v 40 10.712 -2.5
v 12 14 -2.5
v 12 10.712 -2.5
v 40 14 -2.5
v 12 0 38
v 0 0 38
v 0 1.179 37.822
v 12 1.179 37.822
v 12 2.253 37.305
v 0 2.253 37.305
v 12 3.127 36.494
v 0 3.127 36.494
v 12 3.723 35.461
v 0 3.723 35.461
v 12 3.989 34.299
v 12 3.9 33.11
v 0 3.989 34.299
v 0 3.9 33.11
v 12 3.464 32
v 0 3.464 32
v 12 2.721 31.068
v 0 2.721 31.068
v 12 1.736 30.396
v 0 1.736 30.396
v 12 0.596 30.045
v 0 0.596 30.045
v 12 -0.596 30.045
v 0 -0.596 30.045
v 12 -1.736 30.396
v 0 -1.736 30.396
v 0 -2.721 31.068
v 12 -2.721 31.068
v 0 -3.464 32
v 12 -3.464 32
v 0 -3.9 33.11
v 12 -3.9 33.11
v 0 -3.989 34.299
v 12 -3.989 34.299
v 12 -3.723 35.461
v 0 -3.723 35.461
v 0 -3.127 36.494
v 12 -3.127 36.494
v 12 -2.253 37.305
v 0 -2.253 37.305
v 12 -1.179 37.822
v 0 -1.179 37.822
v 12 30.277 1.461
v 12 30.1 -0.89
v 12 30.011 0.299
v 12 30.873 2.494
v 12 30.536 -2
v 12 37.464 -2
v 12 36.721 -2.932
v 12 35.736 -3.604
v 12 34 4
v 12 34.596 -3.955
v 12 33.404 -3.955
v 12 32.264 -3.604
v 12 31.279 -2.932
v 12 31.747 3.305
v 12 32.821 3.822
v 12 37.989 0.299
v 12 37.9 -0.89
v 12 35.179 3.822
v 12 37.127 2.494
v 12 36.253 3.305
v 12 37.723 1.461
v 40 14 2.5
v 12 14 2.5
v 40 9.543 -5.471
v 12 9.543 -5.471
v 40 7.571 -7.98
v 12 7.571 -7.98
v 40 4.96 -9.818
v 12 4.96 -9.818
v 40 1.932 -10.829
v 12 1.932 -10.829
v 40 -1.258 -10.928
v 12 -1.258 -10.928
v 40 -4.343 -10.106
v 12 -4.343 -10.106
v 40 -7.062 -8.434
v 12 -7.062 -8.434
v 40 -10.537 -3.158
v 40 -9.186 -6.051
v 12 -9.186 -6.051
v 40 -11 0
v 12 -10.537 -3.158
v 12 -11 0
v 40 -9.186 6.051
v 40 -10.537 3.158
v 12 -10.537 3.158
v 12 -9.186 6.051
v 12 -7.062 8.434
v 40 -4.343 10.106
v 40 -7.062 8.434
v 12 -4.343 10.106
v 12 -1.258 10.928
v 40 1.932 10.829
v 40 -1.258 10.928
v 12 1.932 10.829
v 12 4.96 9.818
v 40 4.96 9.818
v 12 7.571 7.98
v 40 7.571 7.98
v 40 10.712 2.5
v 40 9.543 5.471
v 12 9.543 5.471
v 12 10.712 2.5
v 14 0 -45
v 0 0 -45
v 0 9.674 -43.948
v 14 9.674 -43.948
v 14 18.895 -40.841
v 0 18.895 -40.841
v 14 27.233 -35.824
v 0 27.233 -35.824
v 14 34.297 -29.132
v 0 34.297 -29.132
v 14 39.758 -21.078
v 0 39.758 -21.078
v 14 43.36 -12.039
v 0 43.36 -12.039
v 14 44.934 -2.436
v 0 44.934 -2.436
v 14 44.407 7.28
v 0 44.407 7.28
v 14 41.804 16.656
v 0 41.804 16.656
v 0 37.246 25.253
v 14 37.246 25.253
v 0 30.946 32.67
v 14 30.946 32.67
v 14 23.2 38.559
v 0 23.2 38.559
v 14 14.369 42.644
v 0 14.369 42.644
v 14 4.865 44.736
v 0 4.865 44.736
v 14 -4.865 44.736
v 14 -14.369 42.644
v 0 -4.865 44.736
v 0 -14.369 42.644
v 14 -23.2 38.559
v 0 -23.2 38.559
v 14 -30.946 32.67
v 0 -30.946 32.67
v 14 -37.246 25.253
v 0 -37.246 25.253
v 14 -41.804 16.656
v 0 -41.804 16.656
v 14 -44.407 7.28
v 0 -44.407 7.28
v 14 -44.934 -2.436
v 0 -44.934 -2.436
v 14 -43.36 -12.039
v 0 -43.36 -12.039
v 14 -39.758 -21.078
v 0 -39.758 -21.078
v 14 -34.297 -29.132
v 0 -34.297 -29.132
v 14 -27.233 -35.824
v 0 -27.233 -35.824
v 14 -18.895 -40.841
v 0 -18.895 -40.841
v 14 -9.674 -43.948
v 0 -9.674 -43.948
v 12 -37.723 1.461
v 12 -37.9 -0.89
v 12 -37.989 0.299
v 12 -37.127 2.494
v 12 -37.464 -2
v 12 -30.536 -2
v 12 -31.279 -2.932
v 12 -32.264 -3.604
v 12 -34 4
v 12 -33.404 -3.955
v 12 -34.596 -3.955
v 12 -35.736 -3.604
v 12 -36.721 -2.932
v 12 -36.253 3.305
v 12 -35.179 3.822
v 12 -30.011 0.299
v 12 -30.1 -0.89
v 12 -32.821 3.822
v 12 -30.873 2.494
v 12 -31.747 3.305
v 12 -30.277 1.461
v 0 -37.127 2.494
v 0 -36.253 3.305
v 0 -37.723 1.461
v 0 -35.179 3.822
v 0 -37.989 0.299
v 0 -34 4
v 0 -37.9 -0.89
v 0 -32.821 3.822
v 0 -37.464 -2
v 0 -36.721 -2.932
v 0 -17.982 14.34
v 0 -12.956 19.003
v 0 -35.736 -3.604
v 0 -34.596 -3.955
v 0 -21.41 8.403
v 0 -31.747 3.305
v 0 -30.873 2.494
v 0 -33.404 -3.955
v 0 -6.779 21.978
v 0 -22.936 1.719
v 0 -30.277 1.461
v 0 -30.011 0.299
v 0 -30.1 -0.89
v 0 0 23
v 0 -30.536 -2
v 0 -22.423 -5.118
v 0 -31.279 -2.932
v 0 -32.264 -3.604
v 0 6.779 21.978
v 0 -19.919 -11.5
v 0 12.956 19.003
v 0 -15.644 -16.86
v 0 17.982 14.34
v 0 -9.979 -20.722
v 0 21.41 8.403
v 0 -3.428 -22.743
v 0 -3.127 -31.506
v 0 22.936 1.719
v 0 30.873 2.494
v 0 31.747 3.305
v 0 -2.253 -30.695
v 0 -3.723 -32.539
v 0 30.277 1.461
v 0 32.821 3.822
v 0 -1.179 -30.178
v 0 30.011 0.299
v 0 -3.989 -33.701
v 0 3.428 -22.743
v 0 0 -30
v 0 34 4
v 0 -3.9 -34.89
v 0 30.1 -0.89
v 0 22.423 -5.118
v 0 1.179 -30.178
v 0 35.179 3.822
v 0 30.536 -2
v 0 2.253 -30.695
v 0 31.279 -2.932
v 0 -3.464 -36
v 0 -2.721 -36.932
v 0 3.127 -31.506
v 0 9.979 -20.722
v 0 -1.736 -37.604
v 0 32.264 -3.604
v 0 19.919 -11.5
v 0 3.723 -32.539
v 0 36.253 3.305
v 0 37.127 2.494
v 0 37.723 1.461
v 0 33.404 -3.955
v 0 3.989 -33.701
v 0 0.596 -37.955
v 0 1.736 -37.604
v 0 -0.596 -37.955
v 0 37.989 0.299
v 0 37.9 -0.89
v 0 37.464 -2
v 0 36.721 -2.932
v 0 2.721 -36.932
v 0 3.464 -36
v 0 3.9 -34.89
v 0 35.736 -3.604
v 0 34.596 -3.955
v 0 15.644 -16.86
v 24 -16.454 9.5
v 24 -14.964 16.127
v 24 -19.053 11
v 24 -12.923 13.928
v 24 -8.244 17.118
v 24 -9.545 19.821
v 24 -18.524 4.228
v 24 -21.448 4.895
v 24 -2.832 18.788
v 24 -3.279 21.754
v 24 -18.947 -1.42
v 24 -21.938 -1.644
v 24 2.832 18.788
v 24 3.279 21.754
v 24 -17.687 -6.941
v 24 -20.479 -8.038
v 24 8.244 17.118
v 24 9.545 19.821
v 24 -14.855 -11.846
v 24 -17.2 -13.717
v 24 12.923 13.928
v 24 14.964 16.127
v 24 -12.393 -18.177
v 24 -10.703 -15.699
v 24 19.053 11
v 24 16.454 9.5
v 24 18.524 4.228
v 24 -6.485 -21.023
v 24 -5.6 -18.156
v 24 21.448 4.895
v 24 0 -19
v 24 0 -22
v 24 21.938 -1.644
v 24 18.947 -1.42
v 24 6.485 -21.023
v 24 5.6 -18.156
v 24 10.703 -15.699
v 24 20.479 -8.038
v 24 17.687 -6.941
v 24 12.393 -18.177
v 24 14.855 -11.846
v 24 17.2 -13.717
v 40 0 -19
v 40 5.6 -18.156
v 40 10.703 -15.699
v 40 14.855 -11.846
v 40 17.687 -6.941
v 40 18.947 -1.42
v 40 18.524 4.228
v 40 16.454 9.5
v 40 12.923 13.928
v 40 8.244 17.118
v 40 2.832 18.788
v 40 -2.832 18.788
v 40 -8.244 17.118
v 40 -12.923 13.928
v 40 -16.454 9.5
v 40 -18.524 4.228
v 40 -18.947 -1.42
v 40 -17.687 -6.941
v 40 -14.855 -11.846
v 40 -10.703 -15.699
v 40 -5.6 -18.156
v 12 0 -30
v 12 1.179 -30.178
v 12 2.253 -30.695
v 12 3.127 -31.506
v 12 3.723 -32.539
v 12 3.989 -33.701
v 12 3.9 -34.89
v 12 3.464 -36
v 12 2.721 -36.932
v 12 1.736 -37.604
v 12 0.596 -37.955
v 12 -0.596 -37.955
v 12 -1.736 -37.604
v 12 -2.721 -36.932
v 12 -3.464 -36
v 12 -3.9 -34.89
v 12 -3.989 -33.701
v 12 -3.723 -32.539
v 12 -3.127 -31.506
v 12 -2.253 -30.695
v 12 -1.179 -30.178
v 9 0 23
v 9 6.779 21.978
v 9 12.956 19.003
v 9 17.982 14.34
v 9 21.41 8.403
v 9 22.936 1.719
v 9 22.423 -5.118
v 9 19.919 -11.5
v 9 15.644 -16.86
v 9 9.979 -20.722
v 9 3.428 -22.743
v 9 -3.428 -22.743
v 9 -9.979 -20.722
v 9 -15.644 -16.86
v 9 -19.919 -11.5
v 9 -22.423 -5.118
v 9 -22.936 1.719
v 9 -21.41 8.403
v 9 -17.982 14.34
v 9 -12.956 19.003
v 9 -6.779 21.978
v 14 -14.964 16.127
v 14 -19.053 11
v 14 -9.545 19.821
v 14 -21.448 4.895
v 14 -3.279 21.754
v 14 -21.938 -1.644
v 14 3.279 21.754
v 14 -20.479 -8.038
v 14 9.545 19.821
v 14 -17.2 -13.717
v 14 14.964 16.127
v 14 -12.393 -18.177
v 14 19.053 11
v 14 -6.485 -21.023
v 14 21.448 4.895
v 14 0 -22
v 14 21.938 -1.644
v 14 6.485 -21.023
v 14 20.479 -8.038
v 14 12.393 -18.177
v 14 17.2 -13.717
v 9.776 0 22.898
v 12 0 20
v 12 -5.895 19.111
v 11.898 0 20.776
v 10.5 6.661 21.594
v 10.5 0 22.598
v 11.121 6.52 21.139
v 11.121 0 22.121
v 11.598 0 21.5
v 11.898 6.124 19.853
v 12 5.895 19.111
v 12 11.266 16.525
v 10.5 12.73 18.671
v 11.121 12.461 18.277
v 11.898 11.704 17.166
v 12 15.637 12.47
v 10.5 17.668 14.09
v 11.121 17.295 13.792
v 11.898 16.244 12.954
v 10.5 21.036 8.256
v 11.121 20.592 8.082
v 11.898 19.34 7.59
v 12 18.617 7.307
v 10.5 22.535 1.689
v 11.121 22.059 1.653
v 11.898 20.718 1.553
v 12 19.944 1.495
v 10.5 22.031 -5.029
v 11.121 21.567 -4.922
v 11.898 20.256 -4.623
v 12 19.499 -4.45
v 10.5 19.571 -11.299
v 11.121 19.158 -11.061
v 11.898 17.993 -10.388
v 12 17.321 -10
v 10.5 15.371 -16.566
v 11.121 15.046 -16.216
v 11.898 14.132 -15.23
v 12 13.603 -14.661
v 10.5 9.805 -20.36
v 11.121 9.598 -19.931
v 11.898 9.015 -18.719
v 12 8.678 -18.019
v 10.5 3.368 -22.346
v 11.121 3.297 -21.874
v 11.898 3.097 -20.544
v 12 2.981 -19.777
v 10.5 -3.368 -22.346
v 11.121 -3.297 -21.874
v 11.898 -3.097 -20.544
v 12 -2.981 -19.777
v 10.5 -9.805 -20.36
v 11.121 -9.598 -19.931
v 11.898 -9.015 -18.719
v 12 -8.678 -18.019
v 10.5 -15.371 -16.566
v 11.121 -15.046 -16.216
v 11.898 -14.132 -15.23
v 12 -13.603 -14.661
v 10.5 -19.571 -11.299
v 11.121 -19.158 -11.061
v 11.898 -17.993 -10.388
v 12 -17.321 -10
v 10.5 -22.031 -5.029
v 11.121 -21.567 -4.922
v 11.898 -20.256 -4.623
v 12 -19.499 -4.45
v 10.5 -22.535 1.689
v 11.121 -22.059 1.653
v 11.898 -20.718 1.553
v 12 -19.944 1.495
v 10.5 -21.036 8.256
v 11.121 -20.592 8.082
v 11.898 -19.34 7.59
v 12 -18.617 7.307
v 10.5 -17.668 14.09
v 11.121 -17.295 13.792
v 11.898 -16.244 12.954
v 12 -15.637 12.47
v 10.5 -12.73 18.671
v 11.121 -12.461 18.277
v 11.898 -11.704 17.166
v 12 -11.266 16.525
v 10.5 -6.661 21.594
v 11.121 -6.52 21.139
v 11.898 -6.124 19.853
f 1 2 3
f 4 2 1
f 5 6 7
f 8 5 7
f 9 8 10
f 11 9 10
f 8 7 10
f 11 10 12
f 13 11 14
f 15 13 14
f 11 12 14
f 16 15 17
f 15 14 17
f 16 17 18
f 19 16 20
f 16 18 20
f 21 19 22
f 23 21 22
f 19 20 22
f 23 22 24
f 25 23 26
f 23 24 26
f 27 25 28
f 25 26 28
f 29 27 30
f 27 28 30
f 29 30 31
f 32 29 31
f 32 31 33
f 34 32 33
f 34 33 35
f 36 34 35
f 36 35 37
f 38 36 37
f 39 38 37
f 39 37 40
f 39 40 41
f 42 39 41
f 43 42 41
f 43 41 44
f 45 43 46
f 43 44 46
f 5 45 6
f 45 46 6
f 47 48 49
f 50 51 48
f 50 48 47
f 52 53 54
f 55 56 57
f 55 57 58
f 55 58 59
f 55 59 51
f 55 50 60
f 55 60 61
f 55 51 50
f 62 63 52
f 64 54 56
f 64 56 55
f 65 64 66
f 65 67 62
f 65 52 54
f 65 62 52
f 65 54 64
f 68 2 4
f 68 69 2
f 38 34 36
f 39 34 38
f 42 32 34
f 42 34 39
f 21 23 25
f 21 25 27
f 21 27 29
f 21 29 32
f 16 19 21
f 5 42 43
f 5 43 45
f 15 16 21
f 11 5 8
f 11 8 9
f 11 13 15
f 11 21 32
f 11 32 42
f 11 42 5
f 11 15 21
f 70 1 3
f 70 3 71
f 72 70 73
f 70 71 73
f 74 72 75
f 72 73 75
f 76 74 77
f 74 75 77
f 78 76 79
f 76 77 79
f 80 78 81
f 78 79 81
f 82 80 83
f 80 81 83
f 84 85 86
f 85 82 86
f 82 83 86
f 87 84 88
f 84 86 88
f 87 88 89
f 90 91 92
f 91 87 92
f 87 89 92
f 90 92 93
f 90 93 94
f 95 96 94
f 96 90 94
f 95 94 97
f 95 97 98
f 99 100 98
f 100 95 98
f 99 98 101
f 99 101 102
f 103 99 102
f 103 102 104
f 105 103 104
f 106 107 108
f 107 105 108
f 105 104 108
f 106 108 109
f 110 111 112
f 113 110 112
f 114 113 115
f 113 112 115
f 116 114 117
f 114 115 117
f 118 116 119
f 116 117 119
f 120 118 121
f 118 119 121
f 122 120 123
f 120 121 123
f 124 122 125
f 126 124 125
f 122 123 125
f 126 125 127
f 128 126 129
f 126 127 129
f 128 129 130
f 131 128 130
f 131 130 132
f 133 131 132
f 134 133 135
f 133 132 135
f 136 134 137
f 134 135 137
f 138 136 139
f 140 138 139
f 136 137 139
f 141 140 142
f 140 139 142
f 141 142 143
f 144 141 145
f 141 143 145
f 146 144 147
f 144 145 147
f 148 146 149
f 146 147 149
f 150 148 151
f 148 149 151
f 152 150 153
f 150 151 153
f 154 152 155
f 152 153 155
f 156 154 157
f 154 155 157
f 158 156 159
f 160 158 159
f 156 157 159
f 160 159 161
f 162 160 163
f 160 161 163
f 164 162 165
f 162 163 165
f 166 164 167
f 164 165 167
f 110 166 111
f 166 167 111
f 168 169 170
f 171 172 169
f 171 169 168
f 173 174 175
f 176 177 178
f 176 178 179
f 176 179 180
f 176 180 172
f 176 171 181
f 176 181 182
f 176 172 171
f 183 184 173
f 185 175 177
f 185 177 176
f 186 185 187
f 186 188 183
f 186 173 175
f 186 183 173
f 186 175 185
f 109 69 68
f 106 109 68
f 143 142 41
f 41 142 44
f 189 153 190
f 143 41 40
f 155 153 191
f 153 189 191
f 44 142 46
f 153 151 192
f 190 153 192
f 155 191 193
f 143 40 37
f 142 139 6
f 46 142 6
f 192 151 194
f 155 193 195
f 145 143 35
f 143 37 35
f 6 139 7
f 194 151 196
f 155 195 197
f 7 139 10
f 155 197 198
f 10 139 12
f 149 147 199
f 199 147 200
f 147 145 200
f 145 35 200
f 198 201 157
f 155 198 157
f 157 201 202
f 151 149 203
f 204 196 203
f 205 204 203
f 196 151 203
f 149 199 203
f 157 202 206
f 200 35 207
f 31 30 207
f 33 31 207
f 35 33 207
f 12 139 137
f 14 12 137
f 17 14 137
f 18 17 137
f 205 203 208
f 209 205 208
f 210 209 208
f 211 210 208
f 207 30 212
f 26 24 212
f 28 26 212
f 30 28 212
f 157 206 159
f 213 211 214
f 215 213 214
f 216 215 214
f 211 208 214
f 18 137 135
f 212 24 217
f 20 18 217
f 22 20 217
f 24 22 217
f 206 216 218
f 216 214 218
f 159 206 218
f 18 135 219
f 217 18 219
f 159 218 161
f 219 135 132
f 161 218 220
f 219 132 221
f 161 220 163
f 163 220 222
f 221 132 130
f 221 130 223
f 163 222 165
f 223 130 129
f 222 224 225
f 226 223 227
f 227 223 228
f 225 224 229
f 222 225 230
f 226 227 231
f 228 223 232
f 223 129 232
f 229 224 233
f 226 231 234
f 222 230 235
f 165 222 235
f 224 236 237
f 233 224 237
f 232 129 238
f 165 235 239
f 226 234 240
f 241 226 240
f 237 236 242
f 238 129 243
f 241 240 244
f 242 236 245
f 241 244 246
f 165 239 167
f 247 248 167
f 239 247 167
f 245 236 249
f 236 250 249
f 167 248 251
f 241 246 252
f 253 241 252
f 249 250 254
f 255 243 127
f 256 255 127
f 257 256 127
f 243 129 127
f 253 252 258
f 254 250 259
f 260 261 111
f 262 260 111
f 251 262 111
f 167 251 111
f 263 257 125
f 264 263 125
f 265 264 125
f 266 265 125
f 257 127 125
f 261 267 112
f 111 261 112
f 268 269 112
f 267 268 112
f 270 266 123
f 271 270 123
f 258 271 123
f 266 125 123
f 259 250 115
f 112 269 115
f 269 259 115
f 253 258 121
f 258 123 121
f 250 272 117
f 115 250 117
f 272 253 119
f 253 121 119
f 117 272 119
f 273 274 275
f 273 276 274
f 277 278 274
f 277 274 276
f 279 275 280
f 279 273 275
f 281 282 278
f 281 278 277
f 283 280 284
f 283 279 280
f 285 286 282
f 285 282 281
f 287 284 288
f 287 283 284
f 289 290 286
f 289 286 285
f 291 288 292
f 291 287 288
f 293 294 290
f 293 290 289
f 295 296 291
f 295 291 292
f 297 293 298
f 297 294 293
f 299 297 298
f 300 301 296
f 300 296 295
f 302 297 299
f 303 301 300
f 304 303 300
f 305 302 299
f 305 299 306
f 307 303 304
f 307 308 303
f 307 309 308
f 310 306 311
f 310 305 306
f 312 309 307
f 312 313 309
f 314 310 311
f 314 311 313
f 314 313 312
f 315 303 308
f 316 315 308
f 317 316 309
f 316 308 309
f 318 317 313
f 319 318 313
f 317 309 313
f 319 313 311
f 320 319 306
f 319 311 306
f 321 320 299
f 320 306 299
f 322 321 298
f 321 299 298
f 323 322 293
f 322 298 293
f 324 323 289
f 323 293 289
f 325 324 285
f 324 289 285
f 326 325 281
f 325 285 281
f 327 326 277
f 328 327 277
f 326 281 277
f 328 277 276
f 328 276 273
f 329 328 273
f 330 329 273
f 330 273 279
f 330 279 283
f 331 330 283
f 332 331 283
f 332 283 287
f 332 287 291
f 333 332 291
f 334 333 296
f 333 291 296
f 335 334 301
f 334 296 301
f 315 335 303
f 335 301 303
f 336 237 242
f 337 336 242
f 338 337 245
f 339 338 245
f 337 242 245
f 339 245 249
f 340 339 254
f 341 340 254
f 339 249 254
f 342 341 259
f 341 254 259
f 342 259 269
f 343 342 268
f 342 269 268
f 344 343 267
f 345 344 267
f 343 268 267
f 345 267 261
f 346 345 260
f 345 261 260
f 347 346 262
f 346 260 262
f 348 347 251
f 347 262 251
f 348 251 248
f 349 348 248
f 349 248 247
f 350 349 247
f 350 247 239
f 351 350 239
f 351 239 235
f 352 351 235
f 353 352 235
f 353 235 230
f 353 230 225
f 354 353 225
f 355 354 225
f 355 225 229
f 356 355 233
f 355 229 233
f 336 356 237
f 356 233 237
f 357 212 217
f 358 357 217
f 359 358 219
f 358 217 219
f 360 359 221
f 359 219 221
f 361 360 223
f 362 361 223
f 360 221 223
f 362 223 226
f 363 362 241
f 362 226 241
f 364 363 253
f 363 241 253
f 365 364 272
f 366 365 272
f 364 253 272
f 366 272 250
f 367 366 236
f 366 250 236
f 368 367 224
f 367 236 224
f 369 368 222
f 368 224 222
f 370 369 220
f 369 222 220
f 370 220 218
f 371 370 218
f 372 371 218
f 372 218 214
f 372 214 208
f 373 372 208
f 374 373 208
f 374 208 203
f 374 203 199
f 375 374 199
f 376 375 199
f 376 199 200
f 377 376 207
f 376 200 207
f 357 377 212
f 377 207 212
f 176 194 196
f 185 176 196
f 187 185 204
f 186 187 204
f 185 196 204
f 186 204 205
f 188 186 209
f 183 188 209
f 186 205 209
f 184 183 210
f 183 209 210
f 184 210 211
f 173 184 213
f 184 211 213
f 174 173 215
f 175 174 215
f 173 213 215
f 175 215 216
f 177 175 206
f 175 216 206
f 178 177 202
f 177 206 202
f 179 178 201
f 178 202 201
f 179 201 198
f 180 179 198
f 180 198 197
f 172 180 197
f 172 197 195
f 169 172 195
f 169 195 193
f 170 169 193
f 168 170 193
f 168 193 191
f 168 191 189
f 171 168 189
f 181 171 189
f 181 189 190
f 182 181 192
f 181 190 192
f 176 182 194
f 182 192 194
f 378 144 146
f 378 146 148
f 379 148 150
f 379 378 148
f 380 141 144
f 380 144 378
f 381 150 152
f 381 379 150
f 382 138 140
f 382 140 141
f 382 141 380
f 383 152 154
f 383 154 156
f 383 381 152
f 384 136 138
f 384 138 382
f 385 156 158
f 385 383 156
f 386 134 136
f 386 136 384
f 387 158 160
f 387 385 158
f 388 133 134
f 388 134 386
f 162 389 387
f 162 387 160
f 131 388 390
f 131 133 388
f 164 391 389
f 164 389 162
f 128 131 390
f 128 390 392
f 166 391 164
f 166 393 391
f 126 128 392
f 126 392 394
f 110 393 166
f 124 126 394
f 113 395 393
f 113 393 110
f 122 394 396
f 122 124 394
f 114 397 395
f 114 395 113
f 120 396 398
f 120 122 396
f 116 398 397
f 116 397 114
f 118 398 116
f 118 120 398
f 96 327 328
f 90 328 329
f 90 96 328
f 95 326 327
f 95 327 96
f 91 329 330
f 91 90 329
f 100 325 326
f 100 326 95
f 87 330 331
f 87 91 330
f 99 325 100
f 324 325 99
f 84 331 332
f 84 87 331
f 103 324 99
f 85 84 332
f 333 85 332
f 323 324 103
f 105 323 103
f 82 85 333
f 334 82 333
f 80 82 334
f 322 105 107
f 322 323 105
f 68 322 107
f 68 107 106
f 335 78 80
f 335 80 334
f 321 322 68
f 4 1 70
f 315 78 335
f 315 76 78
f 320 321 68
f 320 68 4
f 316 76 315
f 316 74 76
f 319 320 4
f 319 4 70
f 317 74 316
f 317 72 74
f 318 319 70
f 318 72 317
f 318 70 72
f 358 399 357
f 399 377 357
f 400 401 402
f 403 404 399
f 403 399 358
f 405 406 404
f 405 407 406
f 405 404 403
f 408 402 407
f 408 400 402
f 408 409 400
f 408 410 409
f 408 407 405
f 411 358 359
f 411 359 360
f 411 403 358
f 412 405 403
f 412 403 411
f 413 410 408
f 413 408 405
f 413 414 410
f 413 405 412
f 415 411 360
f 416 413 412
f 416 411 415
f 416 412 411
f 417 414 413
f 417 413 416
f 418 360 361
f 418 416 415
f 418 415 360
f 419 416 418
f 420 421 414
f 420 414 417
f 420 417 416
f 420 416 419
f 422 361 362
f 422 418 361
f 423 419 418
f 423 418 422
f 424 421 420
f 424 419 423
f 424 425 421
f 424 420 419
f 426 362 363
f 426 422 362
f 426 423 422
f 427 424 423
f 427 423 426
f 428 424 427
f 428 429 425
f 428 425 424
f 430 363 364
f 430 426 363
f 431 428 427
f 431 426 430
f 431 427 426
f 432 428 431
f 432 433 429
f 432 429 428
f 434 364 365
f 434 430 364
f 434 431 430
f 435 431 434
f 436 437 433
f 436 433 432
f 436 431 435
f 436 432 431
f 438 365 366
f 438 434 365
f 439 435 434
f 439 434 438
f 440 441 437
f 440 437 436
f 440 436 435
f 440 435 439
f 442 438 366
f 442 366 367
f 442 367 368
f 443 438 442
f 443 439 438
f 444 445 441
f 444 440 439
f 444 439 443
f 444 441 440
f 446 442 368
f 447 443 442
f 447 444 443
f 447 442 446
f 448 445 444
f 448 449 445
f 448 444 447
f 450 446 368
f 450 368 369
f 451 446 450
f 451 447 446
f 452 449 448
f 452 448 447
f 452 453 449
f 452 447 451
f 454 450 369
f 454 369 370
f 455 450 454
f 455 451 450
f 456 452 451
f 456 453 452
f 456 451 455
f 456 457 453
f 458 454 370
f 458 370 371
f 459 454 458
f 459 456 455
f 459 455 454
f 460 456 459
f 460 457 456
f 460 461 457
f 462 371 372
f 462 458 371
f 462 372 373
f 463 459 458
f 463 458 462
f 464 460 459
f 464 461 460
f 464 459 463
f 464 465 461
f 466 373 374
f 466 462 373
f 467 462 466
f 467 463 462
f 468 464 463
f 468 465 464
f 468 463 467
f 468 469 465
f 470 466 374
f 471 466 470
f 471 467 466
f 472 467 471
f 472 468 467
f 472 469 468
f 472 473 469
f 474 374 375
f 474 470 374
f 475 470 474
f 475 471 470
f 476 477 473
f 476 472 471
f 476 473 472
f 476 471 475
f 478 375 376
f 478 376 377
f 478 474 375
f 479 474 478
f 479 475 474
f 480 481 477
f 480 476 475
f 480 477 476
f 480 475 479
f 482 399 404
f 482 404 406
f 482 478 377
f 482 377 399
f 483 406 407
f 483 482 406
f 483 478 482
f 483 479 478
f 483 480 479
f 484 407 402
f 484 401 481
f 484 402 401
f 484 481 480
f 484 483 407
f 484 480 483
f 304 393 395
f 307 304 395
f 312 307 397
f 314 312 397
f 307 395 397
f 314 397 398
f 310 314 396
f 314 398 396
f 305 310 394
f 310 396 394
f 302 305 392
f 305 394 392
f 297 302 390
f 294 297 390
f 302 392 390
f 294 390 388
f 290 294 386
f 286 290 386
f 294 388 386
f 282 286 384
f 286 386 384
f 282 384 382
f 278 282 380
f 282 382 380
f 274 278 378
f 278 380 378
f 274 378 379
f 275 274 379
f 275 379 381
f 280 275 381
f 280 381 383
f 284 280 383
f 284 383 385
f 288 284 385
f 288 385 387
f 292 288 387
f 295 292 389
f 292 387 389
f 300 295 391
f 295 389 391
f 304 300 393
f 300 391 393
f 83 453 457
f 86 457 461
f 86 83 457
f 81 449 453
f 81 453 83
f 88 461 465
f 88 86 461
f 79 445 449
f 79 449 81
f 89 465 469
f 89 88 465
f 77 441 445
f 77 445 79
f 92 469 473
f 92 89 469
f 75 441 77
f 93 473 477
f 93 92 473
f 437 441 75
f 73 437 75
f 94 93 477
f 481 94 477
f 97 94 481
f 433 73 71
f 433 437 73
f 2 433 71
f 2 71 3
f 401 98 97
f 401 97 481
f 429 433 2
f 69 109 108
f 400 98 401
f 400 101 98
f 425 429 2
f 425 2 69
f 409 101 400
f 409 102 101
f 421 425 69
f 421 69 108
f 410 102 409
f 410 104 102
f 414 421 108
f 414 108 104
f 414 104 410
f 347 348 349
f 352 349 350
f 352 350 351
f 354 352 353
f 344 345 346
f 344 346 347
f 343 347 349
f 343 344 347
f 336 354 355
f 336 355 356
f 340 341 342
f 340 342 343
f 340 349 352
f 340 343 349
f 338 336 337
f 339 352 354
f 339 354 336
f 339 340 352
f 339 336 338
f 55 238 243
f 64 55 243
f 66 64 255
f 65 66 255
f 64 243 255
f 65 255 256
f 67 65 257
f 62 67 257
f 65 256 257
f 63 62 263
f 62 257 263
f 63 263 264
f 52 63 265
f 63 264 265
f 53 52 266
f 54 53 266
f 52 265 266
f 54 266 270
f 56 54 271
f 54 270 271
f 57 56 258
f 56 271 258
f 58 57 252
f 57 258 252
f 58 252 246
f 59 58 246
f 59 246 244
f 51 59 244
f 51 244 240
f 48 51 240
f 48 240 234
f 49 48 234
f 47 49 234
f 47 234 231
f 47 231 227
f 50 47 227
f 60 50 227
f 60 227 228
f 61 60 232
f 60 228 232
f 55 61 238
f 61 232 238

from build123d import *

# Parameters (mm, degrees)
SKETCH_1_R          = 45
EXTRUDE_1_DEPTH     = 14
SKETCH_2_R          = 22
EXTRUDE_2_DEPTH     = 10
SKETCH_3_R          = 19
EXTRUDE_3_DEPTH     = 16
SKETCH_4_R          = 23
CUT_EXTRUDE_1_DEPTH = 12
SKETCH_5_R          = 11
CUT_EXTRUDE_2_DEPTH = 29
SKETCH_6_W          = 28
SKETCH_6_H          = 14
CUT_EXTRUDE_3_DEPTH = 2.5
SKETCH_7_R          = 4
CUT_EXTRUDE_4_DEPTH = 12
FILLET_1_R          = 3


with BuildPart() as part:
    # 草图1 → 凸台-拉伸1 (new body)
    with BuildSketch(Plane(origin=(0, 0, 0), x_dir=(0, 0, -1), z_dir=(1, 0, 0))):
        Circle(SKETCH_1_R)
    extrude(amount=EXTRUDE_1_DEPTH)

    # 草图2 → 凸台-拉伸2 (add)
    with BuildSketch(Plane(origin=(14, 0, 0), x_dir=(0, 0, -1), z_dir=(1, 0, 0))):
        Circle(SKETCH_2_R)
    extrude(amount=EXTRUDE_2_DEPTH)

    # 草图3 → 凸台-拉伸3 (add)
    with BuildSketch(Plane(origin=(24, 0, 0), x_dir=(0, 0, -1), z_dir=(1, 0, 0))):
        Circle(SKETCH_3_R)
    extrude(amount=EXTRUDE_3_DEPTH)

    # 草图4 → 切除-拉伸1 (cut)
    with BuildSketch(Plane.ZY):
        Circle(SKETCH_4_R)
    extrude(amount=-CUT_EXTRUDE_1_DEPTH, mode=Mode.SUBTRACT)

    # 草图5 → 切除-拉伸2 (cut, through all)
    with BuildSketch(Plane.ZY.offset(-12)):
        Circle(SKETCH_5_R)
    extrude(amount=-CUT_EXTRUDE_2_DEPTH, mode=Mode.SUBTRACT)

    # 草图6 → 切除-拉伸3 (cut, symmetric)
    with BuildSketch(Plane.XY):
        with Locations((26, 7)):
            Rectangle(SKETCH_6_W, SKETCH_6_H)
    extrude(amount=CUT_EXTRUDE_3_DEPTH, both=True, mode=Mode.SUBTRACT)

    # 草图7 → 切除-拉伸4 (cut)
    with BuildSketch(Plane.ZY):
        with Locations((0, 34)):
            Circle(SKETCH_7_R)
        with Locations((34, 0)):
            Circle(SKETCH_7_R)
        with Locations((0, -34)):
            Circle(SKETCH_7_R)
        with BuildLine():
            ThreePointArc((-38, 0), (-34, -4), (-30, 0))
            Line((-30, 0), (-38, 0))
        make_face()
        with BuildLine():
            Line((-38, 0), (-30, 0))
            ThreePointArc((-30, 0), (-34, 4), (-38, 0))
        make_face()
    extrude(amount=-CUT_EXTRUDE_4_DEPTH, mode=Mode.SUBTRACT)

    # 圆角1
    fillet_1_edges = [part.edges().sort_by_distance(p)[0] for p in [
        (12, 0, -23),
    ]]
    fillet(fillet_1_edges, radius=FILLET_1_R)


solid = part.part
